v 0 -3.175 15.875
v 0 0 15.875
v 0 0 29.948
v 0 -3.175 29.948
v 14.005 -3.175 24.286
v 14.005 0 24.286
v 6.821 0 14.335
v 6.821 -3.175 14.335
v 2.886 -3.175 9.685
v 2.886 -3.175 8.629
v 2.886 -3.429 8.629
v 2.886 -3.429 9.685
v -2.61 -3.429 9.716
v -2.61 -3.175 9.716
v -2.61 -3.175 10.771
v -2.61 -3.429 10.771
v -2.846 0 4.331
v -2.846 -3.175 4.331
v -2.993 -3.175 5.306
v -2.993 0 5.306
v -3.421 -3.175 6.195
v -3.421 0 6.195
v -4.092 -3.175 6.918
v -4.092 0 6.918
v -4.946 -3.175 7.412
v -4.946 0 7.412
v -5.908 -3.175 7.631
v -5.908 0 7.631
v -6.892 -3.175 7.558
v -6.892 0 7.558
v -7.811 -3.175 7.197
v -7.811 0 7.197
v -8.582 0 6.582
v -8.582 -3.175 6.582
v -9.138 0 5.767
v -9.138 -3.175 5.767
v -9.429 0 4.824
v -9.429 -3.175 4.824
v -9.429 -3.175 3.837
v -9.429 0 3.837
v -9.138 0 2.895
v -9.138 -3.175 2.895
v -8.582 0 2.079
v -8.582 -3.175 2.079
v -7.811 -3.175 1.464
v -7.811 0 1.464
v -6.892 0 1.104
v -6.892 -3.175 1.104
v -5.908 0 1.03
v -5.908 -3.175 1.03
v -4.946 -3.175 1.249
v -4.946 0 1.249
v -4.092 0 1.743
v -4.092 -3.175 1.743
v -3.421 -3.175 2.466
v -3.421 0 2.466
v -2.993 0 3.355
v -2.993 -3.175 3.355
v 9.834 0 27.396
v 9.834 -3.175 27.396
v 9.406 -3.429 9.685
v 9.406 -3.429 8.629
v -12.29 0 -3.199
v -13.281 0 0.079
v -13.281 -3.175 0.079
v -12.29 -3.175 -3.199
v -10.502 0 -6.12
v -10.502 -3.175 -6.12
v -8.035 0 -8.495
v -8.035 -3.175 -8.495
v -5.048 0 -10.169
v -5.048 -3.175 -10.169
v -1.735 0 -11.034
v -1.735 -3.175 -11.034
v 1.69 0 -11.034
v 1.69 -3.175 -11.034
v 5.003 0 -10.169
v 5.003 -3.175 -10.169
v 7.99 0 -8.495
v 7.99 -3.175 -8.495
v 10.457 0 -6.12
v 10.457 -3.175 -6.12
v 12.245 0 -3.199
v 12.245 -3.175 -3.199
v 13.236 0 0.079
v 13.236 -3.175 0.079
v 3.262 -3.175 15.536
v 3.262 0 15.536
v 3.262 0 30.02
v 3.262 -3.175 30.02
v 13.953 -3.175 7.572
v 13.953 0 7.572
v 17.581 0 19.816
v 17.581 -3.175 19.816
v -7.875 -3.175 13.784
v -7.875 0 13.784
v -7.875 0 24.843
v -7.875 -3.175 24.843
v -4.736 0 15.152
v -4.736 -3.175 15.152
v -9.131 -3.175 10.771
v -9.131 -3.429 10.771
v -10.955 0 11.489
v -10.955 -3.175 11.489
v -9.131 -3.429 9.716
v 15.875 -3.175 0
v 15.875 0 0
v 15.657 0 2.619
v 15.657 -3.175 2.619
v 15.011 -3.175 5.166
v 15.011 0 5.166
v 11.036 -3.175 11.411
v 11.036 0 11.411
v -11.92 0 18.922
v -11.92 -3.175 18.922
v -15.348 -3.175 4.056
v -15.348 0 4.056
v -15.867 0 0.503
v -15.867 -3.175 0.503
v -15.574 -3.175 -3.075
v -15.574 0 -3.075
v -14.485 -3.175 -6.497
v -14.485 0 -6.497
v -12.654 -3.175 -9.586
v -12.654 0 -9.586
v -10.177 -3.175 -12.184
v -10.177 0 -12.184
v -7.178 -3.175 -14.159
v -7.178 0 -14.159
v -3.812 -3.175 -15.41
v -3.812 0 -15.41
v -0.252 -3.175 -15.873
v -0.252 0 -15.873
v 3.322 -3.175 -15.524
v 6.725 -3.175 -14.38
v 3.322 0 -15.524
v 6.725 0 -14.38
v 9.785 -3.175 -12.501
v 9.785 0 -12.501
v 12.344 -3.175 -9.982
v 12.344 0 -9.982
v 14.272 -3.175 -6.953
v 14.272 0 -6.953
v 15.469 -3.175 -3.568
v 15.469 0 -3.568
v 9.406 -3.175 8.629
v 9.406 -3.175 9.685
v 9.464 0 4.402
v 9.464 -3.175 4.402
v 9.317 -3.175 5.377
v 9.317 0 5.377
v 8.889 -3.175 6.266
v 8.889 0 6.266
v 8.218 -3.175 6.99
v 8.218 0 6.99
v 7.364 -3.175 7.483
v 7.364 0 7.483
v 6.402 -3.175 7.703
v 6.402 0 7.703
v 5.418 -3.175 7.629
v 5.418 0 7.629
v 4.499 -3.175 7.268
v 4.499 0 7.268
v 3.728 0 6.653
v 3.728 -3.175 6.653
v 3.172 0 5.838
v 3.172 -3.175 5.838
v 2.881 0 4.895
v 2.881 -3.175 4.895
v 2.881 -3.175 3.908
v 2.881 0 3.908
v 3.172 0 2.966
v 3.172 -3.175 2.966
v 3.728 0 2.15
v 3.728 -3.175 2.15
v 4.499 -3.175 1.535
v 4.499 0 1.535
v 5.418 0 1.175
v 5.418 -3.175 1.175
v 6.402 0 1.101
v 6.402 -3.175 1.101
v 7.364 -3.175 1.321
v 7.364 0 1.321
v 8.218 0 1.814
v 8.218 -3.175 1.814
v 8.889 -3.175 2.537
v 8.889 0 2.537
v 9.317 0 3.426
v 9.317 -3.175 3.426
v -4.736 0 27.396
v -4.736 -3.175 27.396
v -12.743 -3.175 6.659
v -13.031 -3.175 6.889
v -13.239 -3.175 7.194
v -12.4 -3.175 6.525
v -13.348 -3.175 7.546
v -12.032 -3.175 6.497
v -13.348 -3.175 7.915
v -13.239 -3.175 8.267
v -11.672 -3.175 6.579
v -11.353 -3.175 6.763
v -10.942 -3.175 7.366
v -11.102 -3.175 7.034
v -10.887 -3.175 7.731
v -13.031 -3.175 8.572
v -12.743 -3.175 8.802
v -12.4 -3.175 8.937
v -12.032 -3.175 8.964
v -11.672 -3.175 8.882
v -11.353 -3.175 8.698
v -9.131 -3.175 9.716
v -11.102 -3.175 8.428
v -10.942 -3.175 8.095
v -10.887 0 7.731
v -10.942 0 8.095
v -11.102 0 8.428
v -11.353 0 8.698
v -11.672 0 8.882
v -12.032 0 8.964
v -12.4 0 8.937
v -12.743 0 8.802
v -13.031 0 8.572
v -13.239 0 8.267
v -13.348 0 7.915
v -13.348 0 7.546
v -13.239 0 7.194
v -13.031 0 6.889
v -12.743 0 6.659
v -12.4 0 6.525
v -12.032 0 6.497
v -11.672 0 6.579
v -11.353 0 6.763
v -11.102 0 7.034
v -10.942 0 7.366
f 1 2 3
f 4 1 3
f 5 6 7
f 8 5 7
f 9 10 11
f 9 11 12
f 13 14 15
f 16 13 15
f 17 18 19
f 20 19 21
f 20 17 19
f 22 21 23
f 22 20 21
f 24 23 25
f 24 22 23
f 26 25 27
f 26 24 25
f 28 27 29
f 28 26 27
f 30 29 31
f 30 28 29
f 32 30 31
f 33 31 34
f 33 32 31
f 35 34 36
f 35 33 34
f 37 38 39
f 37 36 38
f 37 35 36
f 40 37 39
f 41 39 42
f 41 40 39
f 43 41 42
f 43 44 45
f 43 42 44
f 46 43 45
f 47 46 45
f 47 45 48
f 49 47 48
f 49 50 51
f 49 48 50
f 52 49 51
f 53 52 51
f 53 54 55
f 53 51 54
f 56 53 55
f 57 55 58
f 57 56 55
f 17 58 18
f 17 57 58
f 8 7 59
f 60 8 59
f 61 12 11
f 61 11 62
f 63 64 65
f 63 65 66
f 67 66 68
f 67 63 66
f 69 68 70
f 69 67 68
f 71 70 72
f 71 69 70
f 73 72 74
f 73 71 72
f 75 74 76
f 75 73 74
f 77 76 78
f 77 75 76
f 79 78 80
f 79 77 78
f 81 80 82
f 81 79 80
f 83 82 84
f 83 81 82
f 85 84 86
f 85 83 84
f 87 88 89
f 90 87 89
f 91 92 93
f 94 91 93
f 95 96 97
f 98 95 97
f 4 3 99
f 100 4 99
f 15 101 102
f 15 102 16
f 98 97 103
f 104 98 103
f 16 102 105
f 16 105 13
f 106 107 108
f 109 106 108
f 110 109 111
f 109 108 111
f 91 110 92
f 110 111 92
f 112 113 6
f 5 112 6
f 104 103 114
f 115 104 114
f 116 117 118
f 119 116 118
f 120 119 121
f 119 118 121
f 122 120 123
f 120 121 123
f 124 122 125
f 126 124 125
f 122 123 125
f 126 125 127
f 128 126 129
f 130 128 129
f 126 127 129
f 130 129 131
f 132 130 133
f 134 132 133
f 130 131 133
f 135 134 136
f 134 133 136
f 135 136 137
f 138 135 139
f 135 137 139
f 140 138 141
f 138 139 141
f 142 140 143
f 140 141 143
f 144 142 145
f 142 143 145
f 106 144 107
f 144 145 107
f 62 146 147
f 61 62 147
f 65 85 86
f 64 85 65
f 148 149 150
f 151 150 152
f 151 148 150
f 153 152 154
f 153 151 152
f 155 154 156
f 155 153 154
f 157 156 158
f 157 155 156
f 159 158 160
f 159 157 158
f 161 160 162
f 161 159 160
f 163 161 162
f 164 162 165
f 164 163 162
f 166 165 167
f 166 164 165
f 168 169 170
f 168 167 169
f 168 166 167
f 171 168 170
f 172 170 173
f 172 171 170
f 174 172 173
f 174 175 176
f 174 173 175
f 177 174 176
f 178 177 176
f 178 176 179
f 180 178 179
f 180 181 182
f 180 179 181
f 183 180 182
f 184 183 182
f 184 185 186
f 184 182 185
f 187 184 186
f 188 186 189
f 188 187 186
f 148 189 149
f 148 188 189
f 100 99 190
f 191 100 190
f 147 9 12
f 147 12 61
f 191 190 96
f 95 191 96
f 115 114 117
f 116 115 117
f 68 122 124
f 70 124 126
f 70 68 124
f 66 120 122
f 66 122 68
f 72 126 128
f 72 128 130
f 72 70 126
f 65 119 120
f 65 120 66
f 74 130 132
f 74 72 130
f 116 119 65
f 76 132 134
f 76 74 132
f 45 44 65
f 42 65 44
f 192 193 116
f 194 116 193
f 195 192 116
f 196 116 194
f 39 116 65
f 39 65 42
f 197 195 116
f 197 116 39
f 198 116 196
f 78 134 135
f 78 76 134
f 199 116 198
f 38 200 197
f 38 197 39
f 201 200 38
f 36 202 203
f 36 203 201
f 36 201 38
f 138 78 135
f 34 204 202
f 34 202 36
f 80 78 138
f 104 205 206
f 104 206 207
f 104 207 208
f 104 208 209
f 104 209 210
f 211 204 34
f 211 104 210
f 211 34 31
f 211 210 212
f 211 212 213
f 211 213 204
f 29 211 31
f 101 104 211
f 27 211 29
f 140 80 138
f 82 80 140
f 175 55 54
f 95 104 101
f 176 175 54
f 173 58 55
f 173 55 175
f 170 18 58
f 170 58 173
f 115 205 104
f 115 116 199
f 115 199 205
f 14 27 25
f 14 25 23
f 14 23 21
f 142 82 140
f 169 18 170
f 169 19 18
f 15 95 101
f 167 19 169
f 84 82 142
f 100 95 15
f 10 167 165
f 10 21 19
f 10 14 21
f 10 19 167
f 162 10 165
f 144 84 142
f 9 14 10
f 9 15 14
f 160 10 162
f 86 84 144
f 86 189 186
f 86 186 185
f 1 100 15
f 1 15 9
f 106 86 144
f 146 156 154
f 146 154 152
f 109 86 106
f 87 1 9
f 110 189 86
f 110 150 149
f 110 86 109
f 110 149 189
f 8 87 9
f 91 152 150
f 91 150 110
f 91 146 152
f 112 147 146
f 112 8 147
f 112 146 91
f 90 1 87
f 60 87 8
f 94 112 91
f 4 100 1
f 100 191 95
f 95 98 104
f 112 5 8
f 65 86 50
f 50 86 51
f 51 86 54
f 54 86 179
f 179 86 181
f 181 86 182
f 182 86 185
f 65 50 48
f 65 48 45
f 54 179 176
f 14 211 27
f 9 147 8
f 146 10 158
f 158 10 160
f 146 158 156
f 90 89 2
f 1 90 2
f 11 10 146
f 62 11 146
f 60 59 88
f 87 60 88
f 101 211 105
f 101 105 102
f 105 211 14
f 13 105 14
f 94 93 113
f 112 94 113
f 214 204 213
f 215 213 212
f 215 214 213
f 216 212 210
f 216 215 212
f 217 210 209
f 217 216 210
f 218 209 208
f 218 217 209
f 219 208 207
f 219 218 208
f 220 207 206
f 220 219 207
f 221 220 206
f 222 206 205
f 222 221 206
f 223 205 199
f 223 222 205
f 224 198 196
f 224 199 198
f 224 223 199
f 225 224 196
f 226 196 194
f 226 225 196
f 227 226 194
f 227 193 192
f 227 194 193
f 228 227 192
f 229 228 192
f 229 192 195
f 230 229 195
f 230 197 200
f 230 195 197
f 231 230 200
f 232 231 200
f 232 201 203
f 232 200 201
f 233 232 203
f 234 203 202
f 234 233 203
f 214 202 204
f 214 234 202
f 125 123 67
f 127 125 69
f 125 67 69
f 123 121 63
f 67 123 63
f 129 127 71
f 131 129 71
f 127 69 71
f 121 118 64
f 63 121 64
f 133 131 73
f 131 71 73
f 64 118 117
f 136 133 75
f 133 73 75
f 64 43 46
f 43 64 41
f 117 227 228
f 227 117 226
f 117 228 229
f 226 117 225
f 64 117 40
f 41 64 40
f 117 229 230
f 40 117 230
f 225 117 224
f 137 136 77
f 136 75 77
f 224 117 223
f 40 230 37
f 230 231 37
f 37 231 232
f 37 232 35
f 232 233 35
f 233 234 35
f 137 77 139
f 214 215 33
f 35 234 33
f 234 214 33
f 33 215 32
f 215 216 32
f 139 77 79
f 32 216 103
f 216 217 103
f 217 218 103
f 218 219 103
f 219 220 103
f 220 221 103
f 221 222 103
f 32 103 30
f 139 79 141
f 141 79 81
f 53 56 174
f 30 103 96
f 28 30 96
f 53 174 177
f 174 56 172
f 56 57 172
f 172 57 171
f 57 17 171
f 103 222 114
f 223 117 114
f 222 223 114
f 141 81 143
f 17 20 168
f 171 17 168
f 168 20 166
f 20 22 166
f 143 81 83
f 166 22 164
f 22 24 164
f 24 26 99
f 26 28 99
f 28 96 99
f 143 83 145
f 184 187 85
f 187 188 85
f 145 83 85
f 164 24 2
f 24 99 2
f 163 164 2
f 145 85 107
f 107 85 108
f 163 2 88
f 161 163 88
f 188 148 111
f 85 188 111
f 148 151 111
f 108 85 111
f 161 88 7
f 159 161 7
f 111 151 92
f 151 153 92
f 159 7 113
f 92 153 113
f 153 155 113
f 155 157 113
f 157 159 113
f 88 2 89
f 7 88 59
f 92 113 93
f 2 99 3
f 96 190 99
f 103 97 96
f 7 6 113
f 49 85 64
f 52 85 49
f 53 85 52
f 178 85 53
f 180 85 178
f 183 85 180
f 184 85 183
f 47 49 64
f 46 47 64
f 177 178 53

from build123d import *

# Parameters (mm, degrees)
F2_DEPTH   = 3.175
F1_R       = 3.3099800026
F2_FACE_R  = 15.875
F3_DEPTH   = 3.176
F4_DEPTH   = 3.176
F5_DEPTH   = 3.176
F1_W       = 6.5204764251
F1_H       = 1.0553477332
F6_DEPTH   = 3.429
F7_DEPTH   = 3.175
F8_DEPTH   = 3.175
F10_DEPTH  = 3.175
F1_R_2     = 1.2371702014
F10_FACE_R = 3.3099800026
F10_FACE_W = 6.5204764251
F10_FACE_H = 1.0553477332
F11_DEPTH  = 3.43
F12_DEPTH  = 3.429


with BuildPart() as f2:
    # F0 (on Front) → F2 (new body)
    with BuildSketch(Plane.XZ):
        with BuildLine():
            ThreePointArc((-15.3480242567, 4.0563254821), (-2.0452065819, -15.7427048196), (15.875, 0))
            ThreePointArc((15.875, 0), (15.3869963752, 3.9058888297), (13.9529883401, 7.5716406003))
            ThreePointArc((13.9529883401, 7.5716406003), (12.6412349384, 9.6028539629), (11.0362168136, 11.4112901743))
            ThreePointArc((11.0362168136, 11.4112901743), (9.0476421038, 13.0443779983), (6.8213515593, 14.3347405943))
            ThreePointArc((6.8213515593, 14.3347405943), (5.0774604505, 15.0411110086), (3.2622452096, 15.5361958404))
            ThreePointArc((3.2622452096, 15.5361958404), (1.6398957334, 15.7900717853), (0, 15.875))
            ThreePointArc((0, 15.875), (-2.3954258199, 15.693232941), (-4.7359968989, 15.152094191))
            ThreePointArc((-4.7359968989, 15.152094191), (-6.342661706, 14.552878323), (-7.8753225223, 13.7838644861))
            ThreePointArc((-7.8753225223, 13.7838644861), (-9.4847902105, 12.730058117), (-10.9549720741, 11.4893085891))
            ThreePointArc((-10.9549720741, 11.4893085891), (-13.6665362642, 8.0772155808), (-15.3480242567, 4.0563254821))
        make_face()
    extrude(amount=F2_DEPTH)

    # F1 (on face) + F2_face (on face) → F3 (cut, through all)
    with BuildSketch(Plane.XZ):
        with Locations((-6.1555983319, 4.3306481437)):
            Circle(F1_R)
    with BuildSketch(Plane.XZ.offset(3.175)):
        Circle(F2_FACE_R)
    extrude(amount=F3_DEPTH, mode=Mode.SUBTRACT)

    # F1 (on face) → F4 (cut, through all)
    with BuildSketch(Plane.XZ):
        with Locations((6.1544640741, 4.4018082744)):
            Circle(F1_R)
    extrude(amount=F4_DEPTH, mode=Mode.SUBTRACT)

    # F1 (on face) → F5 (cut, through all)
    with BuildSketch(Plane.XZ):
        with BuildLine():
            Line((13.2357986914, 0.0787362223), (-13.2809156822, 0.0787362223))
            ThreePointArc((-13.2809156822, 0.0787362223), (-0.0225584954, -11.1437029045), (13.2357986914, 0.0787362223))
        make_face()
    extrude(amount=F5_DEPTH, mode=Mode.SUBTRACT)

    # F1 (on face) → F6 (join)
    with BuildSketch(Plane.XZ):
        with Locations((6.1458884738, 9.15713422)):
            Rectangle(F1_W, F1_H)
    extrude(amount=F6_DEPTH)

    # F0 (on Front) → F7 (join)
    with BuildSketch(Plane.XZ):
        with BuildLine():
            Line((-11.9195533916, 18.9222916961), (-15.3480242567, 4.0563254821))
            ThreePointArc((-15.3480242567, 4.0563254821), (-13.6665362642, 8.0772155808), (-10.9549720741, 11.4893085891))
            Line((-10.9549720741, 11.4893085891), (-11.9195533916, 18.9222916961))
        make_face()
    extrude(amount=F7_DEPTH)

    # F0 (on Front) → F8 (join)
    with BuildSketch(Plane.XZ):
        with BuildLine():
            Line((-7.8753225223, 24.8427737317), (-10.9549720741, 11.4893085891))
            ThreePointArc((-10.9549720741, 11.4893085891), (-9.4847902105, 12.730058117), (-7.8753225223, 13.7838644861))
            Line((-7.8753225223, 13.7838644861), (-7.8753225223, 24.8427737317))
        make_face()
    extrude(amount=F8_DEPTH)

    # F0 (on Front) → F10 (join)
    with BuildSketch(Plane.XZ):
        with BuildLine():
            Line((0, 29.9478769302), (-4.7359968989, 15.152094191))
            ThreePointArc((-4.7359968989, 15.152094191), (-2.3954258199, 15.693232941), (0, 15.875))
            Line((0, 15.875), (0, 29.9478769302))
        make_face()
        with BuildLine():
            ThreePointArc((0, 15.875), (1.6398957334, 15.7900717853), (3.2622452096, 15.5361958404))
            Line((3.2622452096, 15.5361958404), (3.2622452096, 30.0202061216))
            Line((3.2622452096, 30.0202061216), (0, 15.875))
        make_face()
        with BuildLine():
            ThreePointArc((3.2622452096, 15.5361958404), (5.0774604505, 15.0411110086), (6.8213515593, 14.3347405943))
            Line((6.8213515593, 14.3347405943), (9.8336311057, 27.3960871034))
            Line((9.8336311057, 27.3960871034), (3.2622452096, 15.5361958404))
        make_face()
        with BuildLine():
            ThreePointArc((6.8213515593, 14.3347405943), (9.0476421038, 13.0443779983), (11.0362168136, 11.4112901743))
            Line((11.0362168136, 11.4112901743), (14.0054738149, 24.286089465))
            Line((14.0054738149, 24.286089465), (6.8213515593, 14.3347405943))
        make_face()
        with BuildLine():
            ThreePointArc((11.0362168136, 11.4112901743), (12.6412349384, 9.6028539629), (13.9529883401, 7.5716406003))
            Line((13.9529883401, 7.5716406003), (17.5813417882, 19.8162570596))
            Line((17.5813417882, 19.8162570596), (11.0362168136, 11.4112901743))
        make_face()
        with BuildLine():
            Line((-4.7359968989, 27.3960871034), (-7.8753225223, 13.7838644861))
            ThreePointArc((-7.8753225223, 13.7838644861), (-6.342661706, 14.552878323), (-4.7359968989, 15.152094191))
            Line((-4.7359968989, 15.152094191), (-4.7359968989, 27.3960871034))
        make_face()
    extrude(amount=F10_DEPTH)

    # F1 (on face) + F10_face (on face) → F11 (cut, through all)
    with BuildSketch(Plane.XZ):
        with Locations((-12.1244213607, 7.7306859973)):
            Circle(F1_R_2)
    with BuildSketch(Plane(origin=(0.4916351087, -3.175, 5.8381828157), x_dir=(1, 0, 0), z_dir=(0, -1, 0))):
        with BuildLine():
            ThreePointArc((-15.8396593653, -1.7818573336), (-2.5368416906, -21.5808876353), (15.3833648913, -5.8381828157))
            ThreePointArc((15.3833648913, -5.8381828157), (14.8953612665, -1.932293986), (13.4613532315, 1.7334577846))
            Line((13.4613532315, 1.7334577846), (17.0897066795, 13.9780742439))
            Line((17.0897066795, 13.9780742439), (10.544581705, 5.5731073586))
            Line((10.544581705, 5.5731073586), (13.5138387063, 18.4479066493))
            Line((13.5138387063, 18.4479066493), (6.3297164506, 8.4965577786))
            Line((6.3297164506, 8.4965577786), (9.3419959971, 21.5579042877))
            Line((9.3419959971, 21.5579042877), (2.770610101, 9.6980130247))
            Line((2.770610101, 9.6980130247), (2.770610101, 24.1820233059))
            Line((2.770610101, 24.1820233059), (-0.4916351087, 10.0368171843))
            Line((-0.4916351087, 10.0368171843), (-0.4916351087, 24.1096941145))
            Line((-0.4916351087, 24.1096941145), (-5.2276320076, 9.3139113753))
            Line((-5.2276320076, 9.3139113753), (-5.2276320076, 21.5579042877))
            Line((-5.2276320076, 21.5579042877), (-8.3669576309, 7.9456816704))
            Line((-8.3669576309, 7.9456816704), (-8.3669576309, 19.004590916))
            Line((-8.3669576309, 19.004590916), (-11.4466071828, 5.6511257734))
            Line((-11.4466071828, 5.6511257734), (-12.4111885003, 13.0841088804))
            Line((-12.4111885003, 13.0841088804), (-15.8396593653, -1.7818573336))
        make_face()
        with BuildLine():
            ThreePointArc((12.7441635827, -5.7594465934), (-0.5141936041, -16.9818857202), (-13.7725507908, -5.7594465934))
            Line((-13.7725507908, -5.7594465934), (12.7441635827, -5.7594465934))
        make_face(mode=Mode.SUBTRACT)
        with Locations((-6.6472334405, -1.507534672)):
            Circle(F10_FACE_R, mode=Mode.SUBTRACT)
        with Locations((5.6628289654, -1.4363745413)):
            Circle(F10_FACE_R, mode=Mode.SUBTRACT)
        with Locations((5.6542533652, 3.3189514043)):
            Rectangle(F10_FACE_W, F10_FACE_H, mode=Mode.SUBTRACT)
    extrude(amount=F11_DEPTH, mode=Mode.SUBTRACT)

    # F1 (on face) → F12 (join)
    with BuildSketch(Plane.XZ):
        with Locations((-5.870418041, 10.2435215376)):
            Rectangle(F1_W, F1_H)
    extrude(amount=F12_DEPTH)


solid = f2.part
